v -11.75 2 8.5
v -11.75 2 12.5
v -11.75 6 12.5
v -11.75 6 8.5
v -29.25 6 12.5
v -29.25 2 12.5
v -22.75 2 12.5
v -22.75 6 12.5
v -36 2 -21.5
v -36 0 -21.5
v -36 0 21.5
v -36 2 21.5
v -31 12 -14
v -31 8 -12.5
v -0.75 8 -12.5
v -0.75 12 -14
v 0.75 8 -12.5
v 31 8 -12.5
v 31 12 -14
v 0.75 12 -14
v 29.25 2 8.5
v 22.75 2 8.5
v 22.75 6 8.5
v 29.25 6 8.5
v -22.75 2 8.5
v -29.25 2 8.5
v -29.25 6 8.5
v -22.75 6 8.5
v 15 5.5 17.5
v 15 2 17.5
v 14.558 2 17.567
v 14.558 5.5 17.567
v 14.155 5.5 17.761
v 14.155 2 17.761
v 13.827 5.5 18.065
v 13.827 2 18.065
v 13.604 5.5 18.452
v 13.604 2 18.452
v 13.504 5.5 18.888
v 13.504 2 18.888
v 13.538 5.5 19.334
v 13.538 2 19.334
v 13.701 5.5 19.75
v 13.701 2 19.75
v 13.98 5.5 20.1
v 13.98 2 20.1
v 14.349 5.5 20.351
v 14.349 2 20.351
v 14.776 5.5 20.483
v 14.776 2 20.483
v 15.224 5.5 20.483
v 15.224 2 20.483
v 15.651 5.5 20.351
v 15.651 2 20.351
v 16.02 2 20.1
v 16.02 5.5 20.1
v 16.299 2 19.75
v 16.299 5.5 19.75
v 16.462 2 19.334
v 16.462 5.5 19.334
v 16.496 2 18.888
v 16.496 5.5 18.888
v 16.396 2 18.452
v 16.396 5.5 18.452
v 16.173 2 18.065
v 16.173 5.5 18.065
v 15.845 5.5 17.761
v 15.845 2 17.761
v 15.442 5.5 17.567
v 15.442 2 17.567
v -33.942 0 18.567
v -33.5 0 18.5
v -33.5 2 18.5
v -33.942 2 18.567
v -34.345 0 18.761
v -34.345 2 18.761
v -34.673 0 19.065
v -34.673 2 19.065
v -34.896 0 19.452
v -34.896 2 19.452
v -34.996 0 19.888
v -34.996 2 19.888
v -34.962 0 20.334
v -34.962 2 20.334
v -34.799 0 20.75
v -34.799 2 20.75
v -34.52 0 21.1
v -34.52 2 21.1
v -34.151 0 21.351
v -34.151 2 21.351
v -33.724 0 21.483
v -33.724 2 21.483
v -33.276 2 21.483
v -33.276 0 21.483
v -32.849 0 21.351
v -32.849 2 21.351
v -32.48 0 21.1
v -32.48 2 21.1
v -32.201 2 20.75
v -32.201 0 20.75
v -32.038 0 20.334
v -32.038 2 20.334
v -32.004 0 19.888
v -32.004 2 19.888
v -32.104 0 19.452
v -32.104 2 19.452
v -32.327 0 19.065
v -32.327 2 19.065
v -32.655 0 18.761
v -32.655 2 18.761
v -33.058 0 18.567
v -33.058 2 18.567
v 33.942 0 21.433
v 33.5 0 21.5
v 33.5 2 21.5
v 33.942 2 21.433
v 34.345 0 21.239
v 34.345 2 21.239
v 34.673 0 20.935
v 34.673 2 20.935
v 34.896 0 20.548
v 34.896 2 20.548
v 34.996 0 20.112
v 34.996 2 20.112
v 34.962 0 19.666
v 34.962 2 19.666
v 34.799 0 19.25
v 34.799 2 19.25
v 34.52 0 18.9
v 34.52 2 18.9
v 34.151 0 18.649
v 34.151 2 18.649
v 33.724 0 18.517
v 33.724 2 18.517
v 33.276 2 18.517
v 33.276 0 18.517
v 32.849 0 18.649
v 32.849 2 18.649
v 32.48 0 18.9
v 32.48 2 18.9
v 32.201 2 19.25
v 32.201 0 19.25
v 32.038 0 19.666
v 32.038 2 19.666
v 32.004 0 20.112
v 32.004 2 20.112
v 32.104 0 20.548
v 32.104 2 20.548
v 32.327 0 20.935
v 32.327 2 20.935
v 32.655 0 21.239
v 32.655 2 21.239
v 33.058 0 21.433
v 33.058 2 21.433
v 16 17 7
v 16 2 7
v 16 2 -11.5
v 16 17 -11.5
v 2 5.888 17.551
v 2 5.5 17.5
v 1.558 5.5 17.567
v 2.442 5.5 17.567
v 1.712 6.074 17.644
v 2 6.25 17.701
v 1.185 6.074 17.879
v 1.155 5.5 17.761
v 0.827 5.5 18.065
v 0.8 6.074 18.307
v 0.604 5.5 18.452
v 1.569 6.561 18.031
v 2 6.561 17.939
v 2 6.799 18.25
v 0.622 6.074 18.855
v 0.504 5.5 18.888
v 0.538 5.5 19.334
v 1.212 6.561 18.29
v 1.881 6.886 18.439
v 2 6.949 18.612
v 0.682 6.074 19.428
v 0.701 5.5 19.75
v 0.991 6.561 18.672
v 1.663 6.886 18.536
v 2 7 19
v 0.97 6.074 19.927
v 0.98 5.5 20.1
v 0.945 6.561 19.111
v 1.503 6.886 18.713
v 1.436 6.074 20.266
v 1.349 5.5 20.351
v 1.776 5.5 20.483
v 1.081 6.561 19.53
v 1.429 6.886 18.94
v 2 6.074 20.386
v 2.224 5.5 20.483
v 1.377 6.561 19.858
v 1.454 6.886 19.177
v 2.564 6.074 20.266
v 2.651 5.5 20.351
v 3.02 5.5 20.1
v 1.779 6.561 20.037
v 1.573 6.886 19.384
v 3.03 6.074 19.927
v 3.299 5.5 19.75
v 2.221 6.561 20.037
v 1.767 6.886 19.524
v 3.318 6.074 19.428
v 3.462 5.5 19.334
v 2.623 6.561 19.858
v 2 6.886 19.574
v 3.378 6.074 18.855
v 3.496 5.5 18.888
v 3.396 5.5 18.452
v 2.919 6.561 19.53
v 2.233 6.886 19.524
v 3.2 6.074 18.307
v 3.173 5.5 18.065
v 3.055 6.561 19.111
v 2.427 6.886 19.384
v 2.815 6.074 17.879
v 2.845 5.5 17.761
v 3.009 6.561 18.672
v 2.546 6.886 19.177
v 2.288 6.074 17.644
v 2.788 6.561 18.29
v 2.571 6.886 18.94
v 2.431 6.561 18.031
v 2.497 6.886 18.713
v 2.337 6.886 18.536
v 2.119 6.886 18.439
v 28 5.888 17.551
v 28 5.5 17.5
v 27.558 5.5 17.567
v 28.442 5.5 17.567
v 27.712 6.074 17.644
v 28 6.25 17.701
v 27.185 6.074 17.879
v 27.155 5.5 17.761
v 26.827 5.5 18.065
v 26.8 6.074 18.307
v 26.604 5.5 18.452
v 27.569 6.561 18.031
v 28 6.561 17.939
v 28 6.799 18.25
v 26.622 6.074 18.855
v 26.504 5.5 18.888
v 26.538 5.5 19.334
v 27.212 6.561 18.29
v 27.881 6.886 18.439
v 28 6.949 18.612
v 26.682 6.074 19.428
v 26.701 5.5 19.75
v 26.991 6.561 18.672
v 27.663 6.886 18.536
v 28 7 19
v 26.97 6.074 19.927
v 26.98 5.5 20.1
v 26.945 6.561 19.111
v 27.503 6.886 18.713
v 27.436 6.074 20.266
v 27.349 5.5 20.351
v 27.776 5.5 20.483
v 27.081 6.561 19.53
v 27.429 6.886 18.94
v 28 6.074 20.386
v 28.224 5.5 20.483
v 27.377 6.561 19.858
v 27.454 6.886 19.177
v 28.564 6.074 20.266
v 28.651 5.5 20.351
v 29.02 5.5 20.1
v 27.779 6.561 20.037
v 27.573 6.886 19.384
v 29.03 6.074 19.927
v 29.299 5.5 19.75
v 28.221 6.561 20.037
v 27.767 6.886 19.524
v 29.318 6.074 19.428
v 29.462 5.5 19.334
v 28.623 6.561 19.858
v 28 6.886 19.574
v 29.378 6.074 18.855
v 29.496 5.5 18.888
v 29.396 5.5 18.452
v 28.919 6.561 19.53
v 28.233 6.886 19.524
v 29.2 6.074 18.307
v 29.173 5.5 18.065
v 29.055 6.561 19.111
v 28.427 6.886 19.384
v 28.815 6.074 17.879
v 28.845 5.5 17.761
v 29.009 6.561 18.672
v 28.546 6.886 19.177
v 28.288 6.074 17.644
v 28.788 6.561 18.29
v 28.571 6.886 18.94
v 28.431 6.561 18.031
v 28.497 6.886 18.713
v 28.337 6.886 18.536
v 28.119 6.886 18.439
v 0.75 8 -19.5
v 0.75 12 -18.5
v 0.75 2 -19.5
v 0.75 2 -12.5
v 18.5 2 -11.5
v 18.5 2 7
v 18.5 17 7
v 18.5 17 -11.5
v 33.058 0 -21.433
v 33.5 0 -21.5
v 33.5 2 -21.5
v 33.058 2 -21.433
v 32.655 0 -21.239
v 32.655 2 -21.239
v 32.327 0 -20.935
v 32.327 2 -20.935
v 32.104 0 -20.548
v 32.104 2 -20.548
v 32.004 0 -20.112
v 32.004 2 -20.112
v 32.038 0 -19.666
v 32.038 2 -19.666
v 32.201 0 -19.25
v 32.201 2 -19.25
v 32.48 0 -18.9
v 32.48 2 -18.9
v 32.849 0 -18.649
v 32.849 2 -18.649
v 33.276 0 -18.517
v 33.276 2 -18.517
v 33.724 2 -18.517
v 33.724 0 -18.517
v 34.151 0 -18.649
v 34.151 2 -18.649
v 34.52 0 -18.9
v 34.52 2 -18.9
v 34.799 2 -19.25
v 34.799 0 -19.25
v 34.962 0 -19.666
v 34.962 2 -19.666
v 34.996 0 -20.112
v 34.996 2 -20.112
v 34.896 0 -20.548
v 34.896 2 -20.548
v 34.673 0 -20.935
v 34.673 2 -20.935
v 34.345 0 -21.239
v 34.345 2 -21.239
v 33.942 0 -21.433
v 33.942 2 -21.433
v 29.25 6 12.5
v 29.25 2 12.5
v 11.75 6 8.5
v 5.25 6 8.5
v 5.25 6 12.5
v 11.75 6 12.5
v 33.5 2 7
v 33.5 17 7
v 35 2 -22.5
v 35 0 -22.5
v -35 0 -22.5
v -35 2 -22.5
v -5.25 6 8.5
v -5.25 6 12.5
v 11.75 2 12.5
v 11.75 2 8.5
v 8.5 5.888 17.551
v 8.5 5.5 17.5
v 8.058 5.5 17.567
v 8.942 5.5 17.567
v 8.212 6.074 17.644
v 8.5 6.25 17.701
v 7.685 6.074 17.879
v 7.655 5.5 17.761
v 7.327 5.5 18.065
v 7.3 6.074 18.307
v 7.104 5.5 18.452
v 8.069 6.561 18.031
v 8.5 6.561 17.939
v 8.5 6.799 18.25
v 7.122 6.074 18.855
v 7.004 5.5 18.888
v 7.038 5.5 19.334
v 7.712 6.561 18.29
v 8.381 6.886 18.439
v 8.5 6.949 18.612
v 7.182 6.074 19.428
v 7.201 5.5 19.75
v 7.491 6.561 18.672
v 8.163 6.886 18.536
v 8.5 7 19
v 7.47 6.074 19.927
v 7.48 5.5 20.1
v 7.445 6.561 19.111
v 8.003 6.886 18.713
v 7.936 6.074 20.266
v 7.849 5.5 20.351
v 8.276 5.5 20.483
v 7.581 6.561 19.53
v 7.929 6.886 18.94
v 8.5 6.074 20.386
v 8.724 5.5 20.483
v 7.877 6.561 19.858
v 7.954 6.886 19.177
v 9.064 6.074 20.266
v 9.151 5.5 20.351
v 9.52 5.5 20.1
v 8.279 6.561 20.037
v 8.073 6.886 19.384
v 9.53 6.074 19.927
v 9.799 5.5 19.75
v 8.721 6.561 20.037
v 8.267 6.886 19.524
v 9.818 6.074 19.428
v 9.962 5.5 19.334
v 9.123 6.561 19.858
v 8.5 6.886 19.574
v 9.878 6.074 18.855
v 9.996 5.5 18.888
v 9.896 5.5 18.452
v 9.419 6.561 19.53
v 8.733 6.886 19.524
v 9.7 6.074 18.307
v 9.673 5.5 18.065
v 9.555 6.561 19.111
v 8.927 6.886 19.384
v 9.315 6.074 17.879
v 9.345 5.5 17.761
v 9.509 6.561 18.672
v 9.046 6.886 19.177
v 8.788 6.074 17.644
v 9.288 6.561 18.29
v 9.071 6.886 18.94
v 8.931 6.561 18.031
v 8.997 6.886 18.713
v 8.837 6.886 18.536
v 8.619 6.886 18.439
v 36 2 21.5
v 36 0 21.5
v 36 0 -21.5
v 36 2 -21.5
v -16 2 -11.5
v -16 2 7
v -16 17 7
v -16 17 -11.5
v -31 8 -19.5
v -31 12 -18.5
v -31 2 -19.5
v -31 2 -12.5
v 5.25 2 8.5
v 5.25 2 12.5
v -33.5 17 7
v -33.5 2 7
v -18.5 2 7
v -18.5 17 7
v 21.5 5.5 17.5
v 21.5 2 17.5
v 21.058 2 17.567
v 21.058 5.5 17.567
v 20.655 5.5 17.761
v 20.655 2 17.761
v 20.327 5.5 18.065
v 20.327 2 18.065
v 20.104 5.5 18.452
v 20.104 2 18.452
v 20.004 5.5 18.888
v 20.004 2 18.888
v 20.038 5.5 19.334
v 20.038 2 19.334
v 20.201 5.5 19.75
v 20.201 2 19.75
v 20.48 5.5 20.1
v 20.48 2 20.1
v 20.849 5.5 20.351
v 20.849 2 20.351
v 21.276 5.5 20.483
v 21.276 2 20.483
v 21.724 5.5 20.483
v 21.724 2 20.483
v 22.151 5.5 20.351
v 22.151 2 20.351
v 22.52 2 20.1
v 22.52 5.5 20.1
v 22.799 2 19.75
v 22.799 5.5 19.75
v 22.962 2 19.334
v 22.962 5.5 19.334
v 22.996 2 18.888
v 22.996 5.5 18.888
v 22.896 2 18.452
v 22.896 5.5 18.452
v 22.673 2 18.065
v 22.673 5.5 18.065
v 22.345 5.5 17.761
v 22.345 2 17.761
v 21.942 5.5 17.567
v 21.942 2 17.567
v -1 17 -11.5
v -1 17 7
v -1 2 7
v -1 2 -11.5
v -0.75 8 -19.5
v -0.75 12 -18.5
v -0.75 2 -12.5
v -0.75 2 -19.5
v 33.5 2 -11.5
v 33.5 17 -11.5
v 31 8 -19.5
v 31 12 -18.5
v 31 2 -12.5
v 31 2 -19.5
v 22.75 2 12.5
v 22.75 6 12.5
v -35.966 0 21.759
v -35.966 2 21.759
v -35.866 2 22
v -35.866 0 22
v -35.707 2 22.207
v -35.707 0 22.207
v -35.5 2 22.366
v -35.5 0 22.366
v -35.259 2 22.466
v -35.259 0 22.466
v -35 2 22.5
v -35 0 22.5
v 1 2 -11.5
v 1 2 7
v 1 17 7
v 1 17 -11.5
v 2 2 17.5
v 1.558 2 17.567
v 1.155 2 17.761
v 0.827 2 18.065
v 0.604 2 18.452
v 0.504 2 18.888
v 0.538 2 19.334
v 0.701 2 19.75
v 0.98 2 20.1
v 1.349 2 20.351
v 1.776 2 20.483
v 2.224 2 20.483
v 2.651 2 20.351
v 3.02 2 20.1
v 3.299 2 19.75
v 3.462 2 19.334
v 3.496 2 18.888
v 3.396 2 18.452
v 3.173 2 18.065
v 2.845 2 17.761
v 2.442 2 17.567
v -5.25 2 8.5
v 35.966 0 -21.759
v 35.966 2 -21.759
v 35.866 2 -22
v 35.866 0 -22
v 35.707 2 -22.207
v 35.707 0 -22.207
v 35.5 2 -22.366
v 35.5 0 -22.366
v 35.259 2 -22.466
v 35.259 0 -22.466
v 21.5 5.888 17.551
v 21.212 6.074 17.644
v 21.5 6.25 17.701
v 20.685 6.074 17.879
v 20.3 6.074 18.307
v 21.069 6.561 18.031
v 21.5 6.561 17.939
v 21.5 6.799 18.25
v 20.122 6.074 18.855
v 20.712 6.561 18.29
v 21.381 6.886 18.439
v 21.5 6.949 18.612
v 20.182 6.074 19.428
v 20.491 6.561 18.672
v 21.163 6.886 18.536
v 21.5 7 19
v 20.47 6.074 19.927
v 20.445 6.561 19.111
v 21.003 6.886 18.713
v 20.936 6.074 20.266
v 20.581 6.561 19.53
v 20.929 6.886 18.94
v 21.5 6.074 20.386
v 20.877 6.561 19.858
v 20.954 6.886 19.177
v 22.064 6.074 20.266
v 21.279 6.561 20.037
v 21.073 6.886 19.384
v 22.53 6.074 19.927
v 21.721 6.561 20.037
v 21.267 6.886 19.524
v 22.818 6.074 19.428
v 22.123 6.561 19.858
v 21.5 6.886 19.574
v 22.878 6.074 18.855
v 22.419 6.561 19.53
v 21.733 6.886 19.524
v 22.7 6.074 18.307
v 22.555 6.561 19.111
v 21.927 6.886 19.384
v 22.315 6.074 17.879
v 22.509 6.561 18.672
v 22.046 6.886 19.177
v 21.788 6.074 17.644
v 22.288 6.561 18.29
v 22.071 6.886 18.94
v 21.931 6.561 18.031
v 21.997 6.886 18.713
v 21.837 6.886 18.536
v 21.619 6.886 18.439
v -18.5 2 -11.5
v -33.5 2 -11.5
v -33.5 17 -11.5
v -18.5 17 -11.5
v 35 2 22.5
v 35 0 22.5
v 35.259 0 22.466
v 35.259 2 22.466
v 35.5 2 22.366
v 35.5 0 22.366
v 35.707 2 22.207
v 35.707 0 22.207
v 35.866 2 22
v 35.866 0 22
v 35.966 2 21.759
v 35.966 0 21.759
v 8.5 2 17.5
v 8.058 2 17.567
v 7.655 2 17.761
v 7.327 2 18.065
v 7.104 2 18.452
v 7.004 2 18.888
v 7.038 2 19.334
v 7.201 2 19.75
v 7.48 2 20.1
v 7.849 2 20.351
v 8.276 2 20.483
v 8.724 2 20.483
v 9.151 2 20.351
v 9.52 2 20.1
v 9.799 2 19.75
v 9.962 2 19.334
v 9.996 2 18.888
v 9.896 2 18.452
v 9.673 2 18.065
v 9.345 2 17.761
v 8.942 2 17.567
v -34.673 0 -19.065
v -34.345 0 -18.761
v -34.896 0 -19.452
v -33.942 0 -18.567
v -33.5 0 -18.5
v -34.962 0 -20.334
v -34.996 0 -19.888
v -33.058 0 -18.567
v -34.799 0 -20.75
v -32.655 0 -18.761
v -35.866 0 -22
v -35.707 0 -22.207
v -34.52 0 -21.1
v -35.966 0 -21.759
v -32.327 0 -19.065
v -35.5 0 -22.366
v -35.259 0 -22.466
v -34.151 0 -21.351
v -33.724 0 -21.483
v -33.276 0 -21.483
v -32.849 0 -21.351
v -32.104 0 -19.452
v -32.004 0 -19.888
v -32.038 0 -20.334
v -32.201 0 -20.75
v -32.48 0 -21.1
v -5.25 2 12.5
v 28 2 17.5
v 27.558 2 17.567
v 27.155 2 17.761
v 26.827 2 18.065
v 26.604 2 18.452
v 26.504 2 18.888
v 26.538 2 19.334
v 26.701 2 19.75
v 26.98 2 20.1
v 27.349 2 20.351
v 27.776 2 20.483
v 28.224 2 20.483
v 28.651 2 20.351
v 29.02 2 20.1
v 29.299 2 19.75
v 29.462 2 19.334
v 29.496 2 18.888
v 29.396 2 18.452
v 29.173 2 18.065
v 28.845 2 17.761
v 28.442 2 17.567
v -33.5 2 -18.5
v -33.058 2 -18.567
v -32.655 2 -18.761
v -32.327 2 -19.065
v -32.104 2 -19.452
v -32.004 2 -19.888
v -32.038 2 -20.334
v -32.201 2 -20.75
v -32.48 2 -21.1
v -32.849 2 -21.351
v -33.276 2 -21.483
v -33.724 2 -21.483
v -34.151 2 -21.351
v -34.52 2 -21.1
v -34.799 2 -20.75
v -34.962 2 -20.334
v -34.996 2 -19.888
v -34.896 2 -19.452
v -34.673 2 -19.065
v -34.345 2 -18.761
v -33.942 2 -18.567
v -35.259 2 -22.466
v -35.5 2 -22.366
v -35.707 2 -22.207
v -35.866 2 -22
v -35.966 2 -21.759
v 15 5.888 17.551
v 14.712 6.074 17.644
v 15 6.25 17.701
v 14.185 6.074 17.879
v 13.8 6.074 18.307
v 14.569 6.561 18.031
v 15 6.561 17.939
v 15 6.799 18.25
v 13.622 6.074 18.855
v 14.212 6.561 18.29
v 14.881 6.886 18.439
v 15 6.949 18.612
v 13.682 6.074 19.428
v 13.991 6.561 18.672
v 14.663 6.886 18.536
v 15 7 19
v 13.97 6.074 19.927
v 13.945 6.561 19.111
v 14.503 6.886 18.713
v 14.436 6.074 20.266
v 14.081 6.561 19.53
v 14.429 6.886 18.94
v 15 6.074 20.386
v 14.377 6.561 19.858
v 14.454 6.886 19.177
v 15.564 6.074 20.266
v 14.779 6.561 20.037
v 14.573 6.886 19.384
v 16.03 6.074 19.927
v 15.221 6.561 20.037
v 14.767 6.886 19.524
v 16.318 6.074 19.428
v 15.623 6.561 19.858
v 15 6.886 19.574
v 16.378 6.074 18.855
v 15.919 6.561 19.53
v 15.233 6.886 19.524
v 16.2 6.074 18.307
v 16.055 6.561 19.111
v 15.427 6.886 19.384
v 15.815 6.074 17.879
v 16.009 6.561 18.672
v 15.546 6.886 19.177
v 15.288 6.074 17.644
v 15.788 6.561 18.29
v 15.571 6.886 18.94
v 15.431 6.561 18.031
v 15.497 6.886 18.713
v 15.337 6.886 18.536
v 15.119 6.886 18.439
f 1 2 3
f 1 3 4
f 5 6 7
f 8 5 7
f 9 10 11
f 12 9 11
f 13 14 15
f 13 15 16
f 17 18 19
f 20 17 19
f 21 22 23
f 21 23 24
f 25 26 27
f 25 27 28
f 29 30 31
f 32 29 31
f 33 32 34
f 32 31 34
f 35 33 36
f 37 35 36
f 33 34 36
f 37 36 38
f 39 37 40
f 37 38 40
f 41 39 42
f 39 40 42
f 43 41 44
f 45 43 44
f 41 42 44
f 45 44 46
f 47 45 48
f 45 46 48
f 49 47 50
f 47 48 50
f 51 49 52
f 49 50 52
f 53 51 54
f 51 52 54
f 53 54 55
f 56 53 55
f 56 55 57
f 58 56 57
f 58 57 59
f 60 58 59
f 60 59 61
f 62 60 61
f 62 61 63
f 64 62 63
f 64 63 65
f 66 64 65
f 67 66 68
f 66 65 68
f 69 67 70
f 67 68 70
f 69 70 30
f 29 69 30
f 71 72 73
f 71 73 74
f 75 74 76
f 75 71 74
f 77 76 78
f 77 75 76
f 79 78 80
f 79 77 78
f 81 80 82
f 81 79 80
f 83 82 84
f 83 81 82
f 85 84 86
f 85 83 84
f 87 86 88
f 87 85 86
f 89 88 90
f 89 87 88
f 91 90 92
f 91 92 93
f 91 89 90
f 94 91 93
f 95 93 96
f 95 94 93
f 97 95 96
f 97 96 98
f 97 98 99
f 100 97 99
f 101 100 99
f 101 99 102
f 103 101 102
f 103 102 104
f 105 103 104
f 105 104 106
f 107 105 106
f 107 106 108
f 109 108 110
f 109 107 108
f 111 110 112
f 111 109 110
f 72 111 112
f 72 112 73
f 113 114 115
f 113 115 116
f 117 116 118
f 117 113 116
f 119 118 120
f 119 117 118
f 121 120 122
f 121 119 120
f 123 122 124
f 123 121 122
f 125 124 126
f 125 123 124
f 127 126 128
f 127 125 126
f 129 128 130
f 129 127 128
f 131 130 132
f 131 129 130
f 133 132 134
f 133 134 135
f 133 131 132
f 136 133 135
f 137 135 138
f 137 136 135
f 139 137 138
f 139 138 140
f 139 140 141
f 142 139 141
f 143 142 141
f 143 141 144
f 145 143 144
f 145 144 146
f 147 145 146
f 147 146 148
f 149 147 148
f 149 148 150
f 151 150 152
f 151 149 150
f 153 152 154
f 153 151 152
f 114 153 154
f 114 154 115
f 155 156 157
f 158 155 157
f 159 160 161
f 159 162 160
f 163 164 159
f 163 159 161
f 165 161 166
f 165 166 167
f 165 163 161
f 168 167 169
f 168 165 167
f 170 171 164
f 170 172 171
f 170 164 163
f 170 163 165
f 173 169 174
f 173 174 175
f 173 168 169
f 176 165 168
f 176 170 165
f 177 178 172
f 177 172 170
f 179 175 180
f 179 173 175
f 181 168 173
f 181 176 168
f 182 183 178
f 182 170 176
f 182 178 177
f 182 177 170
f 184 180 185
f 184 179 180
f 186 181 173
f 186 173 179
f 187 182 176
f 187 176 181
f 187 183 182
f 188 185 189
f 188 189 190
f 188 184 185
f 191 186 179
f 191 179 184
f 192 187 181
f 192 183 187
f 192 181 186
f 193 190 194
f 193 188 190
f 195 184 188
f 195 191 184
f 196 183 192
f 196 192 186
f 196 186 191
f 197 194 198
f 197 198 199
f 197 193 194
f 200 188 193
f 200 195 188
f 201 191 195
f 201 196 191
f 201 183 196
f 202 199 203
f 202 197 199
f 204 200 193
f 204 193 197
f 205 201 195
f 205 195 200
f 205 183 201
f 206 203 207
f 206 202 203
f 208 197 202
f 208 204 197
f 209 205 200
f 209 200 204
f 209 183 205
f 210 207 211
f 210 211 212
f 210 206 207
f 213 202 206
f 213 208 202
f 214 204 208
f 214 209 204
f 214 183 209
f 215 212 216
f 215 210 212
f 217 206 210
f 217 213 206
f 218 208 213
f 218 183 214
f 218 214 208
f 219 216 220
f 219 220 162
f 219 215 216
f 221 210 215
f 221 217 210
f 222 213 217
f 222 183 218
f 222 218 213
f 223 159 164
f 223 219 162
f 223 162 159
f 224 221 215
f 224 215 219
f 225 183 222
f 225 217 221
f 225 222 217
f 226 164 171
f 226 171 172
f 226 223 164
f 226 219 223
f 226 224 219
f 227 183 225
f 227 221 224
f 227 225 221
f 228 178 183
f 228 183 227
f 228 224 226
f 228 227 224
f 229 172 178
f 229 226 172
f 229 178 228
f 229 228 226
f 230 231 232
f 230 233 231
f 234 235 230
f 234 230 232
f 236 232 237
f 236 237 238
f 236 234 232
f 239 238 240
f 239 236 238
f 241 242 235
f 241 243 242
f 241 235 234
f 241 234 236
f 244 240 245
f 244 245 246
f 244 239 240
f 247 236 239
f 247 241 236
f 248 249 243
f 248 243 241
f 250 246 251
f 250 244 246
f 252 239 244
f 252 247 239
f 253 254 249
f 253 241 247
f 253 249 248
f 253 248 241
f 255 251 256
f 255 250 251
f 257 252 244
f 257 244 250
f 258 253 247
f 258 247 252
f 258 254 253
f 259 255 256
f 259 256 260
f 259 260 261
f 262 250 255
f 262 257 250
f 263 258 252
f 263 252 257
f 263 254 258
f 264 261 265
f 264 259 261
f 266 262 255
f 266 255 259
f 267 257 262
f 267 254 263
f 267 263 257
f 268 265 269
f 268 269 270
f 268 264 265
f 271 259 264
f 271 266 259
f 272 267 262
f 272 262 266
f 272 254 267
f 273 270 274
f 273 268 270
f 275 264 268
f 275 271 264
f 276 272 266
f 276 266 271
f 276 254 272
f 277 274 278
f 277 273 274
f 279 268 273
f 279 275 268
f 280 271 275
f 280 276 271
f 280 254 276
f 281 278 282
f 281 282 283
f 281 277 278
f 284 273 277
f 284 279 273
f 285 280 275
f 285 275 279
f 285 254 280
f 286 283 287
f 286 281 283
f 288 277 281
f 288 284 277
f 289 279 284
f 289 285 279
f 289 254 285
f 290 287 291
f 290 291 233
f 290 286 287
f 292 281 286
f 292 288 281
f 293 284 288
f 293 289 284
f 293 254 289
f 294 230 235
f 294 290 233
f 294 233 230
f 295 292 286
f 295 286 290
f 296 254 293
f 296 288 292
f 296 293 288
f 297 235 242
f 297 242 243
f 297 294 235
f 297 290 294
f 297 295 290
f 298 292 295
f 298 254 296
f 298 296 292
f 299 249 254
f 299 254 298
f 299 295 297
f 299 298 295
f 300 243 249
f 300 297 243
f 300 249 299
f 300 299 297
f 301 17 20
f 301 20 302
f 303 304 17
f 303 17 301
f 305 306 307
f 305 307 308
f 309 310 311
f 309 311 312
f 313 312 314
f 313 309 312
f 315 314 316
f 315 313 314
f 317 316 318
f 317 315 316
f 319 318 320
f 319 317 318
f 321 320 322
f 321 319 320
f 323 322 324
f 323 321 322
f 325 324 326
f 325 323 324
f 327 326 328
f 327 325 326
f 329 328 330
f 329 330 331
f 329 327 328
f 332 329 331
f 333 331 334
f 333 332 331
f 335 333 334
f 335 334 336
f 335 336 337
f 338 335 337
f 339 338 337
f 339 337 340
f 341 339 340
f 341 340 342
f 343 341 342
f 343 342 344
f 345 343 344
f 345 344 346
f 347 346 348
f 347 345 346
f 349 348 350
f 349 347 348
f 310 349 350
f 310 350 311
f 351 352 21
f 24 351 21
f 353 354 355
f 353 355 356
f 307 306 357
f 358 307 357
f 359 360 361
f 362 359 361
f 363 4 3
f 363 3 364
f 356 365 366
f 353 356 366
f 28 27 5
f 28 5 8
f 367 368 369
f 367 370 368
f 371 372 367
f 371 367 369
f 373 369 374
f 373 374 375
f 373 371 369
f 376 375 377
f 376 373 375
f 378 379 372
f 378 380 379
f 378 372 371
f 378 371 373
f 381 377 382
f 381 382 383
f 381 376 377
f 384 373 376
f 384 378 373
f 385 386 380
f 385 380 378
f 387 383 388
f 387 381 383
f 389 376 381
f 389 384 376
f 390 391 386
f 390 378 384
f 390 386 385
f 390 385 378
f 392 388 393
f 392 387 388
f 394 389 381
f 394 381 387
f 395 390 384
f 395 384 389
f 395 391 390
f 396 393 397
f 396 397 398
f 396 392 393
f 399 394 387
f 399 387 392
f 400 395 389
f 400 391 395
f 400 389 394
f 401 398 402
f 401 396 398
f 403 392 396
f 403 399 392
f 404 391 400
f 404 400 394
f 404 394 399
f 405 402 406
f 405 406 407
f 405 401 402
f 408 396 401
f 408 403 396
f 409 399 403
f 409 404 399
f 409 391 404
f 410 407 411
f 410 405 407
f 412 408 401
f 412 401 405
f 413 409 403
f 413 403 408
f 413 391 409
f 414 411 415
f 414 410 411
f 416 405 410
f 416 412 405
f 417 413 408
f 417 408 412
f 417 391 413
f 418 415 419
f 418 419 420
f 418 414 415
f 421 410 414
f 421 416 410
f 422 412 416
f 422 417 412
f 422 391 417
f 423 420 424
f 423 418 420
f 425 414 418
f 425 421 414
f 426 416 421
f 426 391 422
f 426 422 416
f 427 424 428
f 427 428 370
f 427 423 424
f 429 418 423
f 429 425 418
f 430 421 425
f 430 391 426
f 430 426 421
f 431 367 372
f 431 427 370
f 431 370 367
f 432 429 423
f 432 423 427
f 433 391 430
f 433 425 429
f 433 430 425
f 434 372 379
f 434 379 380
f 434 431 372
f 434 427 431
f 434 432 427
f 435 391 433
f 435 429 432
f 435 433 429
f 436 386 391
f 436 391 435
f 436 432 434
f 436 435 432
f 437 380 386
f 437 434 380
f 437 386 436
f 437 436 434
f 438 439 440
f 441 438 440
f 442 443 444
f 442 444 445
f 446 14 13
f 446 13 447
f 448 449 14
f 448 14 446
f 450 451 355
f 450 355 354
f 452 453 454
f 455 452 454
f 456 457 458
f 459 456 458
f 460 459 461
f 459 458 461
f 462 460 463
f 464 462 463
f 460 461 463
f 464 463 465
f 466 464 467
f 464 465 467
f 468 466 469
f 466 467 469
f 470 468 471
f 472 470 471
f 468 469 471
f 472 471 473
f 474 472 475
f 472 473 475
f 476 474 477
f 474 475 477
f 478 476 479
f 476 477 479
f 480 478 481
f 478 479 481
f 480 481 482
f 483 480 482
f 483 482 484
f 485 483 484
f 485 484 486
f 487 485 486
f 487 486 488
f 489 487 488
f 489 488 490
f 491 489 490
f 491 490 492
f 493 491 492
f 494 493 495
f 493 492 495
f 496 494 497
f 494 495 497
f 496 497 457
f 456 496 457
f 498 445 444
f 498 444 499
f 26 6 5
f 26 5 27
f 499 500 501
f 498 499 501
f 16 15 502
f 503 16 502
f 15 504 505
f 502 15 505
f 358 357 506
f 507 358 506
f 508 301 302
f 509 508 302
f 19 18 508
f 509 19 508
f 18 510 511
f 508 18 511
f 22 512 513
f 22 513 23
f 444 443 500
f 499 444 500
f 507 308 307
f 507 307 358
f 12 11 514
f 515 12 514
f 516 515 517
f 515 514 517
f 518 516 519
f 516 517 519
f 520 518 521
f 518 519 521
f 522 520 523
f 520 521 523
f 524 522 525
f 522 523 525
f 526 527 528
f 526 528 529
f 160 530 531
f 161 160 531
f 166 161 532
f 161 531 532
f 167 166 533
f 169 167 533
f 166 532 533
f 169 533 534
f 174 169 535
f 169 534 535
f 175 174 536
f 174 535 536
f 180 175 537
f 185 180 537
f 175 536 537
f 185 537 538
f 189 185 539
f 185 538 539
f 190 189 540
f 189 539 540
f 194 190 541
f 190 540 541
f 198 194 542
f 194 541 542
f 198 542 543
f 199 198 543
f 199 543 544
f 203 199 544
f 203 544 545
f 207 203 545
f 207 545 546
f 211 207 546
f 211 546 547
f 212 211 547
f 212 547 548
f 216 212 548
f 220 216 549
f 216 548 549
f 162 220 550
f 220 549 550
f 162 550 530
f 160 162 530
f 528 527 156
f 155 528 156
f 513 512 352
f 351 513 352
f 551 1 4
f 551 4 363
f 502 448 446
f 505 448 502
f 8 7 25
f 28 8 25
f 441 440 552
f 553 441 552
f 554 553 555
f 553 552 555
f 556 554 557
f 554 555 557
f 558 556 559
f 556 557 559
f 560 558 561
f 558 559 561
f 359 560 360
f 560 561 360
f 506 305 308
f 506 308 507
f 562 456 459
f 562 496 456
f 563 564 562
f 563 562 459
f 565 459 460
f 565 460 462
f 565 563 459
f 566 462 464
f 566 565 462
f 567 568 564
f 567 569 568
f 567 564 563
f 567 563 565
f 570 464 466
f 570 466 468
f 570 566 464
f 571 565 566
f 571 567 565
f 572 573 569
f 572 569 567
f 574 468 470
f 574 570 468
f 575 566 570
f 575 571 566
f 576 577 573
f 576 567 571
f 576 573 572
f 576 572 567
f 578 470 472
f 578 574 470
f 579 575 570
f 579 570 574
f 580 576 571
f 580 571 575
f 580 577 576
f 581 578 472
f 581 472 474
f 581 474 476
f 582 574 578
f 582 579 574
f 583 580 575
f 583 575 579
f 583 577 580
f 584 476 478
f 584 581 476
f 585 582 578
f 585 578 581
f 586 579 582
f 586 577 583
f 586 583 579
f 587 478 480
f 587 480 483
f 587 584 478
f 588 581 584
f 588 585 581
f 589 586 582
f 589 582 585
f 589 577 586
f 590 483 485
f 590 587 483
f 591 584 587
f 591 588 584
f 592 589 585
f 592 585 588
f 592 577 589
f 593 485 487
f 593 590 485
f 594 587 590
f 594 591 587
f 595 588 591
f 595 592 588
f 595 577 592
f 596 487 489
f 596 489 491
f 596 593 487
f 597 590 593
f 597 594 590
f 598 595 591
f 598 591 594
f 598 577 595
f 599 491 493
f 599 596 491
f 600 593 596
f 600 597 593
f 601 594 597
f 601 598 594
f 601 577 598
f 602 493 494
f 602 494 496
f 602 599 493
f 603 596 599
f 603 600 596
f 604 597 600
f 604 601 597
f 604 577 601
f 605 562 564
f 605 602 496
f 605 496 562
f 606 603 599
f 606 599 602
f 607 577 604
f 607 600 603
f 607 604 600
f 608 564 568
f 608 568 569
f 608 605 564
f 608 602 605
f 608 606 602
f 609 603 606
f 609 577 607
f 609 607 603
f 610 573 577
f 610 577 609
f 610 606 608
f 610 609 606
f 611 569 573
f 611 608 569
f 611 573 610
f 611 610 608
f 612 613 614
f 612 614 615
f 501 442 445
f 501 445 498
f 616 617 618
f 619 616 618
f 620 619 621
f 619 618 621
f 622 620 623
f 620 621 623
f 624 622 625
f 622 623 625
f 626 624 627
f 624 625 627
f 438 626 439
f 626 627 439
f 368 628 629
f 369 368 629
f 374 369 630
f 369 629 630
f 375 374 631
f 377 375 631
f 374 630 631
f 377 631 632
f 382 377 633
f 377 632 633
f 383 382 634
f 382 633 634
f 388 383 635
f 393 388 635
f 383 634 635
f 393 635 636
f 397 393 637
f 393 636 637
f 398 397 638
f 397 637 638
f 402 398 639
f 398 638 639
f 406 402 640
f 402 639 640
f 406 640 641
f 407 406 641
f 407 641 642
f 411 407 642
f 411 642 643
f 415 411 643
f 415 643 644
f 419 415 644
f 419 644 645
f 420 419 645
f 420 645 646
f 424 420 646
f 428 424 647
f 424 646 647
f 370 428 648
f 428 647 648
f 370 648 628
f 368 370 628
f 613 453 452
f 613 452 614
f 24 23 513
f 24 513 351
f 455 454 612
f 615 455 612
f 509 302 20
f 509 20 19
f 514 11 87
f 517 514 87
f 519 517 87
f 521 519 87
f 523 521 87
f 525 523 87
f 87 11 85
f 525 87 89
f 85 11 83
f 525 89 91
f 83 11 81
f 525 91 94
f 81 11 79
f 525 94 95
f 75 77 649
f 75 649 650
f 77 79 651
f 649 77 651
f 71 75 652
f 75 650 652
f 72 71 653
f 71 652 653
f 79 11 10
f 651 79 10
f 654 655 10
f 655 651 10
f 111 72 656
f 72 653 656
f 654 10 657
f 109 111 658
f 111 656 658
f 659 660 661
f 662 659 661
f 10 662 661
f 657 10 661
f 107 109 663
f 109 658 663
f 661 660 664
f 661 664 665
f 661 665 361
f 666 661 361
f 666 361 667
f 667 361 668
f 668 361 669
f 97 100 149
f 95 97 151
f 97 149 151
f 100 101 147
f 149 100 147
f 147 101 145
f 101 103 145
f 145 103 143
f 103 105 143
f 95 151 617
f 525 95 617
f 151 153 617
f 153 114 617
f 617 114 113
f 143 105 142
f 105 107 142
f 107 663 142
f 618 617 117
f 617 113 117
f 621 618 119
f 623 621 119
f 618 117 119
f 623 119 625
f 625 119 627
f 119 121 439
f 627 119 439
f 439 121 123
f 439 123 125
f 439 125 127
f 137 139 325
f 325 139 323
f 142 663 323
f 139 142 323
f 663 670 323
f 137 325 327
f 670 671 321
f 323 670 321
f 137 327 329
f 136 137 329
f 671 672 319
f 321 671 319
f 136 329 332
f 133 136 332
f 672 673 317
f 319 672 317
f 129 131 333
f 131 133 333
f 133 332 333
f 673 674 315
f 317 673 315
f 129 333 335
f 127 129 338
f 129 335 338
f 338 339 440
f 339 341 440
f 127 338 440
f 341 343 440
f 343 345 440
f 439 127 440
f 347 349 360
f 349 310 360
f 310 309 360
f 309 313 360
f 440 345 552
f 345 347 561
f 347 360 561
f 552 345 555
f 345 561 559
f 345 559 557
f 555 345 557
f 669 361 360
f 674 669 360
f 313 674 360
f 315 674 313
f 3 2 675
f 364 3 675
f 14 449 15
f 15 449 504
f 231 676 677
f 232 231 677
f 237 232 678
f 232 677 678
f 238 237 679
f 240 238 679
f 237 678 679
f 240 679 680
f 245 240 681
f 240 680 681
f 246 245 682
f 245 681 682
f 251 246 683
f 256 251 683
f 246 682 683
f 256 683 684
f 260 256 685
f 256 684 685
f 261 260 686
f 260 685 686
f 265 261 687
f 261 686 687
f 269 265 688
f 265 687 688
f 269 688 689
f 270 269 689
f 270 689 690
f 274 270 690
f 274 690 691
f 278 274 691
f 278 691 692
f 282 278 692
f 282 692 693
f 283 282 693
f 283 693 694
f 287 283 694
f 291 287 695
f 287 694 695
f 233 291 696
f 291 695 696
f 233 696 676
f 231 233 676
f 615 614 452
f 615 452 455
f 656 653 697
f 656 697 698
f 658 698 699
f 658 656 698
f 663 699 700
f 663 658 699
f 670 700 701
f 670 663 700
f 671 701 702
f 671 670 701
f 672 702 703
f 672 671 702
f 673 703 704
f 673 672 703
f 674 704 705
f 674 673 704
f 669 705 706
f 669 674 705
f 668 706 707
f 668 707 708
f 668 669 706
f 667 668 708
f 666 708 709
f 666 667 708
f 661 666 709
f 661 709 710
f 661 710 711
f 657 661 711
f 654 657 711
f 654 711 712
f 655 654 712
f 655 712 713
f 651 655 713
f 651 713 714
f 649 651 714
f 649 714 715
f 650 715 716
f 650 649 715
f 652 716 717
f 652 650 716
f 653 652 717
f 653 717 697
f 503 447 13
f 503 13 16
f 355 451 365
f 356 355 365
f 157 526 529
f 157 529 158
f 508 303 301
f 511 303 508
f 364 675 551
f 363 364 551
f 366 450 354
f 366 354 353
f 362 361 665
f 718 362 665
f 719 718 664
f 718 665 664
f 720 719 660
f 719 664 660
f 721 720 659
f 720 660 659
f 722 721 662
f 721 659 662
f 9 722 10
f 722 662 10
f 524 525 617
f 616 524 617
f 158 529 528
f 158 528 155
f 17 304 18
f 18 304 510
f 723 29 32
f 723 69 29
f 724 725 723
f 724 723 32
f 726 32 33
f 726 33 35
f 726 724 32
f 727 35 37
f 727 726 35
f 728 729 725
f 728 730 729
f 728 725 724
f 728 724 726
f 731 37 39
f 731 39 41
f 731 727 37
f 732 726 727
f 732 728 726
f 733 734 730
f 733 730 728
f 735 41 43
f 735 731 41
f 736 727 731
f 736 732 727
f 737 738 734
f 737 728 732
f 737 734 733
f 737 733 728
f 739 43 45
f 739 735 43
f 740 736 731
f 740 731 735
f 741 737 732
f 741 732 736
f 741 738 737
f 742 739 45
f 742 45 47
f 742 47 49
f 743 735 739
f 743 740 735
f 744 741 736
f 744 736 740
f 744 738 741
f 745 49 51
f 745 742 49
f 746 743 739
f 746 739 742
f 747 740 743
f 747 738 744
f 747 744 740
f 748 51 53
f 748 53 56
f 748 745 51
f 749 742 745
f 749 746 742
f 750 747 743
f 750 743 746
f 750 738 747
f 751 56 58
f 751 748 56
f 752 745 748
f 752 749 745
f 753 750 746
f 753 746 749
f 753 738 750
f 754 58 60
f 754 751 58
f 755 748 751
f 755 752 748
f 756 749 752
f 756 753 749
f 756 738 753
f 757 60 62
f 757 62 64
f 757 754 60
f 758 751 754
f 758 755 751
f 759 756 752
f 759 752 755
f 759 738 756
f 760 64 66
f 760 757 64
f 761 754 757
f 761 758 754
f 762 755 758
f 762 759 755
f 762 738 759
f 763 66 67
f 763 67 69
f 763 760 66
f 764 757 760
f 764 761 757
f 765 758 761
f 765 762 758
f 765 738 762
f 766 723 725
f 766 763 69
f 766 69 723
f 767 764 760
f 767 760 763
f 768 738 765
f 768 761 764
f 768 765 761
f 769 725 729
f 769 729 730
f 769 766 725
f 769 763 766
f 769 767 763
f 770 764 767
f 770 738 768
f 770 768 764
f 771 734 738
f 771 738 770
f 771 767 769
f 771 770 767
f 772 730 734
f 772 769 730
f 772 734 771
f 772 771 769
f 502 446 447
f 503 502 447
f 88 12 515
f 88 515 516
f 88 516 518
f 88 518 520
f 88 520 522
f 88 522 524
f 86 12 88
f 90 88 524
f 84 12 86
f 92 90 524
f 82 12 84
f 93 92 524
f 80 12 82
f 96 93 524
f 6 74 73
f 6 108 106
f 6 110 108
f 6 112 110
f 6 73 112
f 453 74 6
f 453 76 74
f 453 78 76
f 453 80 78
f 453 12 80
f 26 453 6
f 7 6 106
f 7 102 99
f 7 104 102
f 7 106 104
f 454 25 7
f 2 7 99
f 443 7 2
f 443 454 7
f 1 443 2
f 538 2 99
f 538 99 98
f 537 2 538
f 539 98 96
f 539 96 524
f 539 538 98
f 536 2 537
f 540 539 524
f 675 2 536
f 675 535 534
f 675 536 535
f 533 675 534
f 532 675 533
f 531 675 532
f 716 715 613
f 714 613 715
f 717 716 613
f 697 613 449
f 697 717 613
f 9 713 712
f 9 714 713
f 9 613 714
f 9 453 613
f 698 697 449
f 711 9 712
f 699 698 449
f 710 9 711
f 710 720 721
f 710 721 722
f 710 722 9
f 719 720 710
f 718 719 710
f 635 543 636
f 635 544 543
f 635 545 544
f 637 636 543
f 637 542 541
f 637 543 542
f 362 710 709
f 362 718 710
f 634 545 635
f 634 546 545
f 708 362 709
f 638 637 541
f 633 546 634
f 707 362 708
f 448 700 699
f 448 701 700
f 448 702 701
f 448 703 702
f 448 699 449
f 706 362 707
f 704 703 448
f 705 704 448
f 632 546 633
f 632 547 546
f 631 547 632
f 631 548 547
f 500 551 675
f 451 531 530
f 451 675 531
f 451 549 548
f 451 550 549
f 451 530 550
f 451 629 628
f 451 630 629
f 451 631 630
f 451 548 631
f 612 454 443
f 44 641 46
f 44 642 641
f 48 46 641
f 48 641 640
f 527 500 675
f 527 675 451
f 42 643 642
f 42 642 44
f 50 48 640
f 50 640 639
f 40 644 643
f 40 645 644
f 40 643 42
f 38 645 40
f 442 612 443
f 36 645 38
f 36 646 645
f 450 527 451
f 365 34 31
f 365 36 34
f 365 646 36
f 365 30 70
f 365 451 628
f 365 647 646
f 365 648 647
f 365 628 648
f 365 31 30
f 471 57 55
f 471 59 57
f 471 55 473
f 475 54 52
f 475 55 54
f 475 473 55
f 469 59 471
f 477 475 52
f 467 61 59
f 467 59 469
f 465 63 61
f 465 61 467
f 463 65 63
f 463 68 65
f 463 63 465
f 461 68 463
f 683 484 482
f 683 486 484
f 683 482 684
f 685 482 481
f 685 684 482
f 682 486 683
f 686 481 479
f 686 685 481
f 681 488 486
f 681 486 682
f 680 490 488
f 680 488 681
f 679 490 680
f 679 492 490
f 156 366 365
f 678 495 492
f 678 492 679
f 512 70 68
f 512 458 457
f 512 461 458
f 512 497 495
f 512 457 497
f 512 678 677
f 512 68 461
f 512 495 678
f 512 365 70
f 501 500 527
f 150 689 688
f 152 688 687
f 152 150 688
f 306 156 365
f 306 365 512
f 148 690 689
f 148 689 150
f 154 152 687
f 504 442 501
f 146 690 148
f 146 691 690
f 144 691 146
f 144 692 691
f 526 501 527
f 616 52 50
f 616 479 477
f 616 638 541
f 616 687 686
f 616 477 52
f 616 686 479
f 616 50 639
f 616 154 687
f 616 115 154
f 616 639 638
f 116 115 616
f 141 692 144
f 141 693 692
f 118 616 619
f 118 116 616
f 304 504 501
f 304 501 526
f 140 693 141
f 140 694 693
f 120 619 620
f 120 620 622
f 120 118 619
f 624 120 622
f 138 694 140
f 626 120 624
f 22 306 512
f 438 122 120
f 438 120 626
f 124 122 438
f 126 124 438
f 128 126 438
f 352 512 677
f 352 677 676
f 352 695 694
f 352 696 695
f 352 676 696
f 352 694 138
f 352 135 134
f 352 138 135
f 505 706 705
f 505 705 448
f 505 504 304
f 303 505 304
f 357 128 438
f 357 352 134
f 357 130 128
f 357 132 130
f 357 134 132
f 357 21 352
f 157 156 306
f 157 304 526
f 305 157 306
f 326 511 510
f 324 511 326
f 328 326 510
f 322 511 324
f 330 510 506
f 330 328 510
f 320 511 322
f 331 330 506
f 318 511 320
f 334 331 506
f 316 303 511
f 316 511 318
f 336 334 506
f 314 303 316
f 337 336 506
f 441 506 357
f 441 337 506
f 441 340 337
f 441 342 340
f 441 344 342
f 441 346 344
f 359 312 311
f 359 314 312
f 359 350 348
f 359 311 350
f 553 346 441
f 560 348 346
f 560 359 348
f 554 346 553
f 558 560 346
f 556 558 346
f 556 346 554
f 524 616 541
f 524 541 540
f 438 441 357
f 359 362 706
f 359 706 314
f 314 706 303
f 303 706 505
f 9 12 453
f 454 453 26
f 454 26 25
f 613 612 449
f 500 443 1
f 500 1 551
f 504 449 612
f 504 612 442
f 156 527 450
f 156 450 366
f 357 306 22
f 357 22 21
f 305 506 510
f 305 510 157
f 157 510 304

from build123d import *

# Parameters (mm, degrees)
SKETCH1_R           = 1.5
BOSS_EXTRUDE1_DEPTH = 2
SKETCH2_W           = 30.25
SKETCH2_H           = 7
BOSS_EXTRUDE2_DEPTH = 10
CUT_EXTRUDE1_DEPTH  = 72.688562547
SKETCH4_W           = 15
SKETCH4_H           = 18.5
BOSS_EXTRUDE3_DEPTH = 15
SKETCH5_W           = 6.5
SKETCH5_H           = 4
BOSS_EXTRUDE4_DEPTH = 4
SKETCH6_R           = 1.5
BOSS_EXTRUDE5_DEPTH = 5
FILLET1_R           = 1.5
FILLET2_R           = 1.5
FILLET3_R           = 1.5
FILLET4_R           = 1.5
FILLET5_R           = 1.5


with BuildPart() as part:
    # Sketch1 → Boss-Extrude1 (new body)
    with BuildSketch(Plane(origin=(0, 0, 0), x_dir=(1, 0, 0), z_dir=(0, 1, 0))):
        with BuildLine():
            Line((-35, -22.5), (35, -22.5))
            ThreePointArc((35, -22.5), (35.707106781, -22.207106781), (36, -21.5))
            Line((36, -21.5), (36, 21.5))
            ThreePointArc((36, 21.5), (35.707106781, 22.207106781), (35, 22.5))
            Line((35, 22.5), (-35, 22.5))
            ThreePointArc((-35, 22.5), (-35.707106781, 22.207106781), (-36, 21.5))
            Line((-36, 21.5), (-36, -21.5))
            ThreePointArc((-36, -21.5), (-35.707106781, -22.207106781), (-35, -22.5))
        make_face()
        with Locations(Location((-33.5, 20, 0), (0, 0, 270))):
            Circle(SKETCH1_R, mode=Mode.SUBTRACT)
        with Locations(Location((33.5, 20, 0), (0, 0, 90))):
            Circle(SKETCH1_R, mode=Mode.SUBTRACT)
        with Locations(Location((33.5, -20, 0), (0, 0, 270))):
            Circle(SKETCH1_R, mode=Mode.SUBTRACT)
        with Locations(Location((-33.5, -20, 0), (0, 0, 90))):
            Circle(SKETCH1_R, mode=Mode.SUBTRACT)
    extrude(amount=BOSS_EXTRUDE1_DEPTH)

    # Sketch2 → Boss-Extrude2 (add)
    with BuildSketch(Plane(origin=(0, 2, 0), x_dir=(1, 0, 0), z_dir=(0, 1, 0))):
        with Locations((-15.875, 16)):
            Rectangle(SKETCH2_W, SKETCH2_H)
        with Locations((15.875, 16)):
            Rectangle(SKETCH2_W, SKETCH2_H)
    extrude(amount=BOSS_EXTRUDE2_DEPTH)

    # Sketch3 → Cut-Extrude1 (cut, through all)
    with BuildSketch(Plane.ZY.offset(31)):
        Polygon((-19.5, 8), (-18.5, 12), (-19.5, 12), align=None)
        Polygon((-12.5, 8), (-14, 12), (-12.5, 12), align=None)
    extrude(amount=-CUT_EXTRUDE1_DEPTH, mode=Mode.SUBTRACT)

    # Sketch4 → Boss-Extrude3 (add)
    with BuildSketch(Plane(origin=(0, 2, 0), x_dir=(1, 0, 0), z_dir=(0, 1, 0))):
        with Locations((26, 2.25)):
            Rectangle(SKETCH4_W, SKETCH4_H)
        with Locations((8.5, 2.25)):
            Rectangle(SKETCH4_W, SKETCH4_H)
        with Locations((-8.5, 2.25)):
            Rectangle(SKETCH4_W, SKETCH4_H)
        with Locations((-26, 2.25)):
            Rectangle(SKETCH4_W, SKETCH4_H)
    extrude(amount=BOSS_EXTRUDE3_DEPTH)

    # Sketch5 → Boss-Extrude4 (add)
    with BuildSketch(Plane(origin=(0, 2, 0), x_dir=(1, 0, 0), z_dir=(0, 1, 0))):
        with Locations((-26, -10.5)):
            Rectangle(SKETCH5_W, SKETCH5_H)
        with Locations((-8.5, -10.5)):
            Rectangle(SKETCH5_W, SKETCH5_H)
        with Locations((8.5, -10.5)):
            Rectangle(SKETCH5_W, SKETCH5_H)
        with Locations((26, -10.5)):
            Rectangle(SKETCH5_W, SKETCH5_H)
    extrude(amount=BOSS_EXTRUDE4_DEPTH)

    # Sketch6 → Boss-Extrude5 (add)
    with BuildSketch(Plane(origin=(0, 2, 0), x_dir=(1, 0, 0), z_dir=(0, 1, 0))):
        with Locations(Location((28, -19, 0), (0, 0, 90))):
            Circle(SKETCH6_R)
        with Locations(Location((21.5, -19, 0), (0, 0, 90))):
            Circle(SKETCH6_R)
        with Locations(Location((15, -19, 0), (0, 0, 90))):
            Circle(SKETCH6_R)
        with Locations(Location((8.5, -19, 0), (0, 0, 90))):
            Circle(SKETCH6_R)
        with Locations(Location((2, -19, 0), (0, 0, 90))):
            Circle(SKETCH6_R)
    extrude(amount=BOSS_EXTRUDE5_DEPTH)

    # Fillet1
    fillet1_edges = [part.edges().sort_by_distance(p)[0] for p in [
        (2, 7, 20.5),
    ]]
    fillet(fillet1_edges, radius=FILLET1_R)

    # Fillet2
    fillet2_edges = [part.edges().sort_by_distance(p)[0] for p in [
        (8.5, 7, 20.5),
    ]]
    fillet(fillet2_edges, radius=FILLET2_R)

    # Fillet3
    fillet3_edges = [part.edges().sort_by_distance(p)[0] for p in [
        (15, 7, 20.5),
    ]]
    fillet(fillet3_edges, radius=FILLET3_R)

    # Fillet4
    fillet4_edges = [part.edges().sort_by_distance(p)[0] for p in [
        (21.5, 7, 20.5),
    ]]
    fillet(fillet4_edges, radius=FILLET4_R)

    # Fillet5
    fillet5_edges = [part.edges().sort_by_distance(p)[0] for p in [
        (28, 7, 20.5),
    ]]
    fillet(fillet5_edges, radius=FILLET5_R)


solid = part.part
